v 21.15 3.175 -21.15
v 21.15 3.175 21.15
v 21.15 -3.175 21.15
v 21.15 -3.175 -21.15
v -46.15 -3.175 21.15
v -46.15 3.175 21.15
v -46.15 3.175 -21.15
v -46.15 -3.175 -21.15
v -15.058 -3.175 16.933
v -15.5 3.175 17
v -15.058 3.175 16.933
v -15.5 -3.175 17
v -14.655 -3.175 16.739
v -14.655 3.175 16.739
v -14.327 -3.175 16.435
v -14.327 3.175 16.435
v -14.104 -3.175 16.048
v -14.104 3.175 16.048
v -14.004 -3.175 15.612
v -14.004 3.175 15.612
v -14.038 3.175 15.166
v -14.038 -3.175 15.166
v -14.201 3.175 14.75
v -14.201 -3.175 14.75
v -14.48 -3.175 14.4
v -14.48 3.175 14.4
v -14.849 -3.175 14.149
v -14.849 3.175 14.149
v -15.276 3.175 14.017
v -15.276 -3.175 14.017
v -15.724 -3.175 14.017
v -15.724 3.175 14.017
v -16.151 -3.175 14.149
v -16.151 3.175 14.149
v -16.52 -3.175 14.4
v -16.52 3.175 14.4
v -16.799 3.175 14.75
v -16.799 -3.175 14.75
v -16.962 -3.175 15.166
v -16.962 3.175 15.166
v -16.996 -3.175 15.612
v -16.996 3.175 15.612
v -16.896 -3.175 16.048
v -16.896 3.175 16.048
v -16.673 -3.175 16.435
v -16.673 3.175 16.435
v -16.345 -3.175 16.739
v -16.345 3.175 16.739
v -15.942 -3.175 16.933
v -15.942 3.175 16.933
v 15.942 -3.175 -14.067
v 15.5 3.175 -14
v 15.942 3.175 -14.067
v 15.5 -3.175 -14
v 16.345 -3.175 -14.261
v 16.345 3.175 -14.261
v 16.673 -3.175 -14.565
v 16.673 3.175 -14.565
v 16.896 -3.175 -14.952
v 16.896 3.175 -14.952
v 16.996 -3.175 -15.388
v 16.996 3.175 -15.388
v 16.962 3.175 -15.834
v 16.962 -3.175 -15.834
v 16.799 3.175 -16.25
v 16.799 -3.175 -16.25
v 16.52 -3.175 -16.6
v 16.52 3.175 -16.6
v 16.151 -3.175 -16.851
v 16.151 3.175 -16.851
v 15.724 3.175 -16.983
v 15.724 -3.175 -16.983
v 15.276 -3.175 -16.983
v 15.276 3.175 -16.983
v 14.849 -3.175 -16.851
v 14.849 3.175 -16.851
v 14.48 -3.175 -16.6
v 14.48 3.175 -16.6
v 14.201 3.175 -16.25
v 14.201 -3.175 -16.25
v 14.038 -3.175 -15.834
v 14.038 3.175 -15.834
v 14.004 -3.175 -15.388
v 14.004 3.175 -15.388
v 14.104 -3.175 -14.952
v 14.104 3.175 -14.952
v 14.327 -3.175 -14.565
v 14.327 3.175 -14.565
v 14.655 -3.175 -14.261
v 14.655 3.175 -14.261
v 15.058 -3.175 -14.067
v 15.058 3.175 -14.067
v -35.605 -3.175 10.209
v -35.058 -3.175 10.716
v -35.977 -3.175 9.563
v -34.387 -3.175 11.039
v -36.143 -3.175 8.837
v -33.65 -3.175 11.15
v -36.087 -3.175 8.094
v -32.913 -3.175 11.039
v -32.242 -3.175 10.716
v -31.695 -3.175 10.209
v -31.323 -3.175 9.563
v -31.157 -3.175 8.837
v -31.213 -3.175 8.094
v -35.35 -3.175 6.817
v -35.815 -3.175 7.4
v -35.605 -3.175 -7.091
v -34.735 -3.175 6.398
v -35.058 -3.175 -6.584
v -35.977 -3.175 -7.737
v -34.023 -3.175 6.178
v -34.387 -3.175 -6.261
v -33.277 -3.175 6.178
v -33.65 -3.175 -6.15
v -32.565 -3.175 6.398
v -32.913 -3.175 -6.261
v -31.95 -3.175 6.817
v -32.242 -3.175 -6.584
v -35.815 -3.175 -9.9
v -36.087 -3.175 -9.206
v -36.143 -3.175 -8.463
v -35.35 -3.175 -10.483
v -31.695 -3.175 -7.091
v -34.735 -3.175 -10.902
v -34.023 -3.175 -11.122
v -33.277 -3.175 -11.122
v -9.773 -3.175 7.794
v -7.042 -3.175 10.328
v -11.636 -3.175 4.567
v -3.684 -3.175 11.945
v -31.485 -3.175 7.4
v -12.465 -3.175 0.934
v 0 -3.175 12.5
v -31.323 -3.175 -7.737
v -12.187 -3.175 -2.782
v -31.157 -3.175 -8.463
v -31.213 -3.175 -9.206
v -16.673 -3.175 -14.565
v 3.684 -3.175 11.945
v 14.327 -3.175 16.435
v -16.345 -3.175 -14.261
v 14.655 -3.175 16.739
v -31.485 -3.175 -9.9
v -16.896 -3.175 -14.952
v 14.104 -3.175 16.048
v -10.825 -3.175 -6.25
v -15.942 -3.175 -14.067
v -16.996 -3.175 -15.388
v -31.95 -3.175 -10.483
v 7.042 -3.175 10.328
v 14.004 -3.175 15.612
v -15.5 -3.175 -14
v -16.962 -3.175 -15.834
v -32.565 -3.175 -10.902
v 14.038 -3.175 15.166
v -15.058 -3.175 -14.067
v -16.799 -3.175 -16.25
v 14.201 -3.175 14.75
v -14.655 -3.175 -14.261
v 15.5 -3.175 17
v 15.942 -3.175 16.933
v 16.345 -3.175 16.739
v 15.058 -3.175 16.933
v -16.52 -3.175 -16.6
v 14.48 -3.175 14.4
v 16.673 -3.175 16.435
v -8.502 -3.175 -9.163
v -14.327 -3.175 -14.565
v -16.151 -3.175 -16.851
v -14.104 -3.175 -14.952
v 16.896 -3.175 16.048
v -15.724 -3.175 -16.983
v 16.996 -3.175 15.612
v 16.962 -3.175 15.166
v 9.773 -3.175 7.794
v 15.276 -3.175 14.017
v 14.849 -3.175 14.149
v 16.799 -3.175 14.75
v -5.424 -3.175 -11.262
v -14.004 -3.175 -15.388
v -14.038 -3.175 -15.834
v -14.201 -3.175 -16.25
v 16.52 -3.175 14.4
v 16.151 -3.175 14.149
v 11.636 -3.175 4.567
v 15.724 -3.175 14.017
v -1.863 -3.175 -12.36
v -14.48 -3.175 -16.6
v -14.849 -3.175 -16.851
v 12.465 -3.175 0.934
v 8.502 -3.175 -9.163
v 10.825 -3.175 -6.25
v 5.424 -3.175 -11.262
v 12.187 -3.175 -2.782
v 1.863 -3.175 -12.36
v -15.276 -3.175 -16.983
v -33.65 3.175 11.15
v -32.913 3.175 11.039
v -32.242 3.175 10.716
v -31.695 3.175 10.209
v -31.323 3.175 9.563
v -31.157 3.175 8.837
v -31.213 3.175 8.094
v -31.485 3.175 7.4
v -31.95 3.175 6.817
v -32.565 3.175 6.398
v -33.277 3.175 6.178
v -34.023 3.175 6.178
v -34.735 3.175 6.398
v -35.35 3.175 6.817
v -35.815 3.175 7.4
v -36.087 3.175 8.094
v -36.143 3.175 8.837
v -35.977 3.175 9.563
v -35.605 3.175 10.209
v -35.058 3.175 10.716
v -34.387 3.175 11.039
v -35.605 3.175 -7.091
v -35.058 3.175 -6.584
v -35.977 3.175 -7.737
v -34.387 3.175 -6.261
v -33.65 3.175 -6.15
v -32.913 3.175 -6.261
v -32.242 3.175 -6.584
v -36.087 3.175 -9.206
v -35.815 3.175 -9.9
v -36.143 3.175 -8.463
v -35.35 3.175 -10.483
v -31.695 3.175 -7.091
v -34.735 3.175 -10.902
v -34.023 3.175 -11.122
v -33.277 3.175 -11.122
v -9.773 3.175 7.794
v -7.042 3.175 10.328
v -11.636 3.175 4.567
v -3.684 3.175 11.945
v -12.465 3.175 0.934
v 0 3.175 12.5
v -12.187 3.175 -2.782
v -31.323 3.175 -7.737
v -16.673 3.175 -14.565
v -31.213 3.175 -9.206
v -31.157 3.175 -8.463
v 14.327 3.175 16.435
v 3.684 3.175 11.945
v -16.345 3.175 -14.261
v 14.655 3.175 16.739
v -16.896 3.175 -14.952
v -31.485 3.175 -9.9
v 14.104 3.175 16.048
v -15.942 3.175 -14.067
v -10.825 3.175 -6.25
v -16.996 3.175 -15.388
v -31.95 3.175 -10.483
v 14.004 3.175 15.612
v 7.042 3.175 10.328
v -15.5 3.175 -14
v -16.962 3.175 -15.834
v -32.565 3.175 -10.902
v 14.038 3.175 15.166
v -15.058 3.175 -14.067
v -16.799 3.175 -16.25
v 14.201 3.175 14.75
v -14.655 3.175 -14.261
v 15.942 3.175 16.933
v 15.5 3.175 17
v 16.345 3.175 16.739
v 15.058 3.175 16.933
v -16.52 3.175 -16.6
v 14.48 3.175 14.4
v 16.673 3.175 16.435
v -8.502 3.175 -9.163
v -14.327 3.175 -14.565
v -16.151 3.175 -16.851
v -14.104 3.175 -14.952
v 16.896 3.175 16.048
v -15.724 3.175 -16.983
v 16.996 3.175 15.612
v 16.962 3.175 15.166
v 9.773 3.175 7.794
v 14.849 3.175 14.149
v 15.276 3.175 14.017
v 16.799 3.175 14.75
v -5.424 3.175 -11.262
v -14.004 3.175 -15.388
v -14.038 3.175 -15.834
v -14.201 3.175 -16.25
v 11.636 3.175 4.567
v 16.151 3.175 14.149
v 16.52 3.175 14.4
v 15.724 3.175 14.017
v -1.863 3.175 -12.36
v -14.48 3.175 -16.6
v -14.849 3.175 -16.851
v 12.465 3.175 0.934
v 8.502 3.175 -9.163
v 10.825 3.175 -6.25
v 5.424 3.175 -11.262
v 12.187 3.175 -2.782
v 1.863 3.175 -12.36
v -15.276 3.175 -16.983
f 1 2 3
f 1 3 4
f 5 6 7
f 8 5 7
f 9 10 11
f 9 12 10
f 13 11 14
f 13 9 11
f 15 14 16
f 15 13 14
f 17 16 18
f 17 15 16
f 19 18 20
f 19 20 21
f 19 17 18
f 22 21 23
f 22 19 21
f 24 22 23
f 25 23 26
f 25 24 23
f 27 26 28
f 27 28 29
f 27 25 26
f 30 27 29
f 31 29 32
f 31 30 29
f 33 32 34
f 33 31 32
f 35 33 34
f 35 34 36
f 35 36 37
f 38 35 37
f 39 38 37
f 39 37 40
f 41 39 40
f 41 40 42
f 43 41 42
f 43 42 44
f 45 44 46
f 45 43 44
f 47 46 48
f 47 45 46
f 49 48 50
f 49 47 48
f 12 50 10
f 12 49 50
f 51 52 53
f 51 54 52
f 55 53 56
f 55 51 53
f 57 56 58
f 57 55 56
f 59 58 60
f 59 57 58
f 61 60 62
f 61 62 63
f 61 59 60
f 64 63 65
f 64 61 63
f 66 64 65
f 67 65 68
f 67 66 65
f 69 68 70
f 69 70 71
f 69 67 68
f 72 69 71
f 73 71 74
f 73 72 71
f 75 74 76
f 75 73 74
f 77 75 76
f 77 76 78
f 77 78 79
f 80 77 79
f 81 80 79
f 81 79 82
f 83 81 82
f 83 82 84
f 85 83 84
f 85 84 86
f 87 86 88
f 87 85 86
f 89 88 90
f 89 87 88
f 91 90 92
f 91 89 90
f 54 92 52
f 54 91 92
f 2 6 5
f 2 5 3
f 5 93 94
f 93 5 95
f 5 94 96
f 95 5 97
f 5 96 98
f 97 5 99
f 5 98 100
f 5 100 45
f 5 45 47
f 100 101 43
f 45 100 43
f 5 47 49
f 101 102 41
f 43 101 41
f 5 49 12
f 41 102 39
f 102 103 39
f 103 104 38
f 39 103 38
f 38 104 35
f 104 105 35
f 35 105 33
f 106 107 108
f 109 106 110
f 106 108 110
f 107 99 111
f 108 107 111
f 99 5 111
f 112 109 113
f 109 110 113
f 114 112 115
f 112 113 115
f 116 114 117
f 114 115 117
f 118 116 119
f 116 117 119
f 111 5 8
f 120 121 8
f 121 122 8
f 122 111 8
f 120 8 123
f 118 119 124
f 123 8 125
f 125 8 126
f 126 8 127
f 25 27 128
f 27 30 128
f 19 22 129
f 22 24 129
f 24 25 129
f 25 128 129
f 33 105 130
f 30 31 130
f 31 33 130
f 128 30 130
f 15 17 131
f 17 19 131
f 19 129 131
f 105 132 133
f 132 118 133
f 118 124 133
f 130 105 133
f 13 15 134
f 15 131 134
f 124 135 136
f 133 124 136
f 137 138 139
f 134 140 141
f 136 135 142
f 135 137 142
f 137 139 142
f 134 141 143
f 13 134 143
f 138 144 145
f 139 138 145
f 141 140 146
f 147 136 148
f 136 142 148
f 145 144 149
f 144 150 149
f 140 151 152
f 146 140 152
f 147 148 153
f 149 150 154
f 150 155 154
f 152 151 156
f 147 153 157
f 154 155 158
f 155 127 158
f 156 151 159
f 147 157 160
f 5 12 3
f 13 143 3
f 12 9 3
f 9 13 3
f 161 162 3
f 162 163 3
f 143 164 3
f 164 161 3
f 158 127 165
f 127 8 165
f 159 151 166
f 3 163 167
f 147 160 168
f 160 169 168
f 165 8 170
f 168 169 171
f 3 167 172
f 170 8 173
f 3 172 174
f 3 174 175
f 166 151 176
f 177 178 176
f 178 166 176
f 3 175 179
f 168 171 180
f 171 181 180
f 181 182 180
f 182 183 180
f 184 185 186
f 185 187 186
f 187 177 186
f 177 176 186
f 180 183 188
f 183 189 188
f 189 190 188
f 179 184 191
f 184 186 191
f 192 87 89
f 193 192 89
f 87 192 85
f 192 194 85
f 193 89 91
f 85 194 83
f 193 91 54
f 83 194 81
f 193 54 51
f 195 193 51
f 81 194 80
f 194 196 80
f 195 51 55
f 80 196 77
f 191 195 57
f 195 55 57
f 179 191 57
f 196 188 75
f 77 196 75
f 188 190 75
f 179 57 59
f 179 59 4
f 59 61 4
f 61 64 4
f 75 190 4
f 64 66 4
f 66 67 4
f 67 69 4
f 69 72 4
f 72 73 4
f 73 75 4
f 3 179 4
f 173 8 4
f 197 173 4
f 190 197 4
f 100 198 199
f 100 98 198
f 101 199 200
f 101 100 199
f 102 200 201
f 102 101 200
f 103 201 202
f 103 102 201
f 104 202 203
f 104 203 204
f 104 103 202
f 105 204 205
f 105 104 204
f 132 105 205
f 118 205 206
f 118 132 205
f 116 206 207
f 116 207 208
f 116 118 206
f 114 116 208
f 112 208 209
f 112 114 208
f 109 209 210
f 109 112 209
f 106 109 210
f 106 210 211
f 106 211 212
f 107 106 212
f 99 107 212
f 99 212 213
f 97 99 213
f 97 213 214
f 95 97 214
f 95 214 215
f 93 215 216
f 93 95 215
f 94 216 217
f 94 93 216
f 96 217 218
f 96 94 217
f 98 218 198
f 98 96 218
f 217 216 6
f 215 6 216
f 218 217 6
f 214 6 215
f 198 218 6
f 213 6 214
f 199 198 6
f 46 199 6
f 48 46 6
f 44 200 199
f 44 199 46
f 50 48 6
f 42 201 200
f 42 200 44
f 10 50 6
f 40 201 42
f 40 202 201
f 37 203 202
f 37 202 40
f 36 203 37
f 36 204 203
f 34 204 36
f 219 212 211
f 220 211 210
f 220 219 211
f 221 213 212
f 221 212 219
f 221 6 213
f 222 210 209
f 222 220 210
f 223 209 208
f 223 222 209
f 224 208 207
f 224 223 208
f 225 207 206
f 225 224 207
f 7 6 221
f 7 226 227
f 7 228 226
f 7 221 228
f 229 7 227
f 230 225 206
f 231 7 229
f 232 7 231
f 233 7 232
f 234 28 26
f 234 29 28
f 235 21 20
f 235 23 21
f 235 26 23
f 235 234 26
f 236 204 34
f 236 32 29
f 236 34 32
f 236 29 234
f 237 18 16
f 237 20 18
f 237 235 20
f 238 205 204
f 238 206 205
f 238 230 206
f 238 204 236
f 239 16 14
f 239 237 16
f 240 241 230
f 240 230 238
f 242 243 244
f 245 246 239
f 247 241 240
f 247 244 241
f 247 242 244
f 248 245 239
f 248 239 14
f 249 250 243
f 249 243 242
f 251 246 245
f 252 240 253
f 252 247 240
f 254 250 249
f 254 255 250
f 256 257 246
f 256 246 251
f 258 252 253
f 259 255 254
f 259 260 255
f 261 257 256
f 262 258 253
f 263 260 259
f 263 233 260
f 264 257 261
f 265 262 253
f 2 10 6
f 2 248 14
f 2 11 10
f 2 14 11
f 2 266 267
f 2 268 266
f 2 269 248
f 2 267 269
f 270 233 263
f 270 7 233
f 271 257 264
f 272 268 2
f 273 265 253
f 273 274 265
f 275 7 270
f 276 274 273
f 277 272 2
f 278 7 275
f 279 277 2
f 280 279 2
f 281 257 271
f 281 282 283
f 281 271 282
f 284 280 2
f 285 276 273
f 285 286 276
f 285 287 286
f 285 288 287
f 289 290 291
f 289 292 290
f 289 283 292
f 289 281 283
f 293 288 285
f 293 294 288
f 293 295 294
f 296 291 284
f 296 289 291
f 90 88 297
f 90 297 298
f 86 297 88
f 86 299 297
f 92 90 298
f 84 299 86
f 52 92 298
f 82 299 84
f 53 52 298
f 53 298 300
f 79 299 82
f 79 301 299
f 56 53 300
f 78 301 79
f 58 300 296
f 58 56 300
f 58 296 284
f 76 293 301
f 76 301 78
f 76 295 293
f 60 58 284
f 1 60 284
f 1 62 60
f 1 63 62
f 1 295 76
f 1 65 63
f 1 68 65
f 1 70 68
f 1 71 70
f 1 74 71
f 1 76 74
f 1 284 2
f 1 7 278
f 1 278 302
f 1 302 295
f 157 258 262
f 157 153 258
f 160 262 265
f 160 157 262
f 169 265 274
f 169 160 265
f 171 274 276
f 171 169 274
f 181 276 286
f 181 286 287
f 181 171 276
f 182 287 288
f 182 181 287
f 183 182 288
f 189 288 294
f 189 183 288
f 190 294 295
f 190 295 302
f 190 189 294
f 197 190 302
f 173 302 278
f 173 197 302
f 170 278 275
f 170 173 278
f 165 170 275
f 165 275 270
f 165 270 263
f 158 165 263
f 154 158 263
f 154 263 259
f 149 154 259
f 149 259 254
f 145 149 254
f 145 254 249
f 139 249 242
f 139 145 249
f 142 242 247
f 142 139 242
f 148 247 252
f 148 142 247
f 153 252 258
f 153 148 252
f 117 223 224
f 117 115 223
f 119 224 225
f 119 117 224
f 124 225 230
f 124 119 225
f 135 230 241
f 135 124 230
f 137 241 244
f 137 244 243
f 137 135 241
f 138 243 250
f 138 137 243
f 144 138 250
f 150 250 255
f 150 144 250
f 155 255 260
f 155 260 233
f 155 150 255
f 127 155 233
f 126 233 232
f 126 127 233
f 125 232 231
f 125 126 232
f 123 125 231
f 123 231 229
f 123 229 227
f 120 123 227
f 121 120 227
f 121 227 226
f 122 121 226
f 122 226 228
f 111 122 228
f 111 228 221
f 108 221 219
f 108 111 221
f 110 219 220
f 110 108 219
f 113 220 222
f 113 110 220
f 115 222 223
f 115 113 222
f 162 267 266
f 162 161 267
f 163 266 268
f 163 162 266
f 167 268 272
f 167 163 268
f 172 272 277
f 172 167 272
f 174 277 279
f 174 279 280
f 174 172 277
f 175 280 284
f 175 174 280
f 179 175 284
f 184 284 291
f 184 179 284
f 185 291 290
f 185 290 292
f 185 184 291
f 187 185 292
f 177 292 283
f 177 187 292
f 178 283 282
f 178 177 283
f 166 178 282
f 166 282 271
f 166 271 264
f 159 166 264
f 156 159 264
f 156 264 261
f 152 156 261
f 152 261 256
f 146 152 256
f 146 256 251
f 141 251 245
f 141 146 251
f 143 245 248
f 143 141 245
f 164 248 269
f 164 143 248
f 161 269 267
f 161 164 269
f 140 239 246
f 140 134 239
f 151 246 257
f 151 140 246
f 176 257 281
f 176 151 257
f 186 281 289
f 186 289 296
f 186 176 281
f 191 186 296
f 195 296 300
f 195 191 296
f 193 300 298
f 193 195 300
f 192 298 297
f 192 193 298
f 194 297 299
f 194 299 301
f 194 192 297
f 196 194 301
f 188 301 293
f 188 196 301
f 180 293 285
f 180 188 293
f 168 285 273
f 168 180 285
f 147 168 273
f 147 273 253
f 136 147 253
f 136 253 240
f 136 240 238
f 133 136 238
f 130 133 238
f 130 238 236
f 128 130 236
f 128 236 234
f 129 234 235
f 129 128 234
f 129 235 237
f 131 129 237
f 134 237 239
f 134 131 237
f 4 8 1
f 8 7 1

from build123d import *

# Parameters (mm, degrees)
SKETCH1_W           = 67.3
SKETCH1_H           = 42.3
SKETCH1_R           = 1.5
SKETCH1_R_2         = 12.5
SKETCH1_R_3         = 2.5
BOSS_EXTRUDE1_DEPTH = 3.175


with BuildPart() as part:
    # Sketch1 → Boss-Extrude1 (new, symmetric)
    with BuildSketch(Plane(origin=(0, 0, 0), x_dir=(1, 0, 0), z_dir=(0, 1, 0))):
        with Locations((-12.5, 0)):
            Rectangle(SKETCH1_W, SKETCH1_H)
        with Locations(Location((15.5, -15.5, 0), (0, 0, 270))):
            Circle(SKETCH1_R, mode=Mode.SUBTRACT)
        with Locations(Location((15.5, 15.5, 0), (0, 0, 270))):
            Circle(SKETCH1_R, mode=Mode.SUBTRACT)
        with Locations(Location((-15.5, 15.5, 0), (0, 0, 270))):
            Circle(SKETCH1_R, mode=Mode.SUBTRACT)
        with Locations(Location((-15.5, -15.5, 0), (0, 0, 270))):
            Circle(SKETCH1_R, mode=Mode.SUBTRACT)
        with Locations(Location((0, 0, 0), (0, 0, 270))):
            Circle(SKETCH1_R_2, mode=Mode.SUBTRACT)
        with Locations(Location((-33.65, 8.65, 0), (0, 0, 270))):
            Circle(SKETCH1_R_3, mode=Mode.SUBTRACT)
        with Locations(Location((-33.65, -8.65, 0), (0, 0, 270))):
            Circle(SKETCH1_R_3, mode=Mode.SUBTRACT)
    extrude(amount=BOSS_EXTRUDE1_DEPTH, both=True)


solid = part.part
